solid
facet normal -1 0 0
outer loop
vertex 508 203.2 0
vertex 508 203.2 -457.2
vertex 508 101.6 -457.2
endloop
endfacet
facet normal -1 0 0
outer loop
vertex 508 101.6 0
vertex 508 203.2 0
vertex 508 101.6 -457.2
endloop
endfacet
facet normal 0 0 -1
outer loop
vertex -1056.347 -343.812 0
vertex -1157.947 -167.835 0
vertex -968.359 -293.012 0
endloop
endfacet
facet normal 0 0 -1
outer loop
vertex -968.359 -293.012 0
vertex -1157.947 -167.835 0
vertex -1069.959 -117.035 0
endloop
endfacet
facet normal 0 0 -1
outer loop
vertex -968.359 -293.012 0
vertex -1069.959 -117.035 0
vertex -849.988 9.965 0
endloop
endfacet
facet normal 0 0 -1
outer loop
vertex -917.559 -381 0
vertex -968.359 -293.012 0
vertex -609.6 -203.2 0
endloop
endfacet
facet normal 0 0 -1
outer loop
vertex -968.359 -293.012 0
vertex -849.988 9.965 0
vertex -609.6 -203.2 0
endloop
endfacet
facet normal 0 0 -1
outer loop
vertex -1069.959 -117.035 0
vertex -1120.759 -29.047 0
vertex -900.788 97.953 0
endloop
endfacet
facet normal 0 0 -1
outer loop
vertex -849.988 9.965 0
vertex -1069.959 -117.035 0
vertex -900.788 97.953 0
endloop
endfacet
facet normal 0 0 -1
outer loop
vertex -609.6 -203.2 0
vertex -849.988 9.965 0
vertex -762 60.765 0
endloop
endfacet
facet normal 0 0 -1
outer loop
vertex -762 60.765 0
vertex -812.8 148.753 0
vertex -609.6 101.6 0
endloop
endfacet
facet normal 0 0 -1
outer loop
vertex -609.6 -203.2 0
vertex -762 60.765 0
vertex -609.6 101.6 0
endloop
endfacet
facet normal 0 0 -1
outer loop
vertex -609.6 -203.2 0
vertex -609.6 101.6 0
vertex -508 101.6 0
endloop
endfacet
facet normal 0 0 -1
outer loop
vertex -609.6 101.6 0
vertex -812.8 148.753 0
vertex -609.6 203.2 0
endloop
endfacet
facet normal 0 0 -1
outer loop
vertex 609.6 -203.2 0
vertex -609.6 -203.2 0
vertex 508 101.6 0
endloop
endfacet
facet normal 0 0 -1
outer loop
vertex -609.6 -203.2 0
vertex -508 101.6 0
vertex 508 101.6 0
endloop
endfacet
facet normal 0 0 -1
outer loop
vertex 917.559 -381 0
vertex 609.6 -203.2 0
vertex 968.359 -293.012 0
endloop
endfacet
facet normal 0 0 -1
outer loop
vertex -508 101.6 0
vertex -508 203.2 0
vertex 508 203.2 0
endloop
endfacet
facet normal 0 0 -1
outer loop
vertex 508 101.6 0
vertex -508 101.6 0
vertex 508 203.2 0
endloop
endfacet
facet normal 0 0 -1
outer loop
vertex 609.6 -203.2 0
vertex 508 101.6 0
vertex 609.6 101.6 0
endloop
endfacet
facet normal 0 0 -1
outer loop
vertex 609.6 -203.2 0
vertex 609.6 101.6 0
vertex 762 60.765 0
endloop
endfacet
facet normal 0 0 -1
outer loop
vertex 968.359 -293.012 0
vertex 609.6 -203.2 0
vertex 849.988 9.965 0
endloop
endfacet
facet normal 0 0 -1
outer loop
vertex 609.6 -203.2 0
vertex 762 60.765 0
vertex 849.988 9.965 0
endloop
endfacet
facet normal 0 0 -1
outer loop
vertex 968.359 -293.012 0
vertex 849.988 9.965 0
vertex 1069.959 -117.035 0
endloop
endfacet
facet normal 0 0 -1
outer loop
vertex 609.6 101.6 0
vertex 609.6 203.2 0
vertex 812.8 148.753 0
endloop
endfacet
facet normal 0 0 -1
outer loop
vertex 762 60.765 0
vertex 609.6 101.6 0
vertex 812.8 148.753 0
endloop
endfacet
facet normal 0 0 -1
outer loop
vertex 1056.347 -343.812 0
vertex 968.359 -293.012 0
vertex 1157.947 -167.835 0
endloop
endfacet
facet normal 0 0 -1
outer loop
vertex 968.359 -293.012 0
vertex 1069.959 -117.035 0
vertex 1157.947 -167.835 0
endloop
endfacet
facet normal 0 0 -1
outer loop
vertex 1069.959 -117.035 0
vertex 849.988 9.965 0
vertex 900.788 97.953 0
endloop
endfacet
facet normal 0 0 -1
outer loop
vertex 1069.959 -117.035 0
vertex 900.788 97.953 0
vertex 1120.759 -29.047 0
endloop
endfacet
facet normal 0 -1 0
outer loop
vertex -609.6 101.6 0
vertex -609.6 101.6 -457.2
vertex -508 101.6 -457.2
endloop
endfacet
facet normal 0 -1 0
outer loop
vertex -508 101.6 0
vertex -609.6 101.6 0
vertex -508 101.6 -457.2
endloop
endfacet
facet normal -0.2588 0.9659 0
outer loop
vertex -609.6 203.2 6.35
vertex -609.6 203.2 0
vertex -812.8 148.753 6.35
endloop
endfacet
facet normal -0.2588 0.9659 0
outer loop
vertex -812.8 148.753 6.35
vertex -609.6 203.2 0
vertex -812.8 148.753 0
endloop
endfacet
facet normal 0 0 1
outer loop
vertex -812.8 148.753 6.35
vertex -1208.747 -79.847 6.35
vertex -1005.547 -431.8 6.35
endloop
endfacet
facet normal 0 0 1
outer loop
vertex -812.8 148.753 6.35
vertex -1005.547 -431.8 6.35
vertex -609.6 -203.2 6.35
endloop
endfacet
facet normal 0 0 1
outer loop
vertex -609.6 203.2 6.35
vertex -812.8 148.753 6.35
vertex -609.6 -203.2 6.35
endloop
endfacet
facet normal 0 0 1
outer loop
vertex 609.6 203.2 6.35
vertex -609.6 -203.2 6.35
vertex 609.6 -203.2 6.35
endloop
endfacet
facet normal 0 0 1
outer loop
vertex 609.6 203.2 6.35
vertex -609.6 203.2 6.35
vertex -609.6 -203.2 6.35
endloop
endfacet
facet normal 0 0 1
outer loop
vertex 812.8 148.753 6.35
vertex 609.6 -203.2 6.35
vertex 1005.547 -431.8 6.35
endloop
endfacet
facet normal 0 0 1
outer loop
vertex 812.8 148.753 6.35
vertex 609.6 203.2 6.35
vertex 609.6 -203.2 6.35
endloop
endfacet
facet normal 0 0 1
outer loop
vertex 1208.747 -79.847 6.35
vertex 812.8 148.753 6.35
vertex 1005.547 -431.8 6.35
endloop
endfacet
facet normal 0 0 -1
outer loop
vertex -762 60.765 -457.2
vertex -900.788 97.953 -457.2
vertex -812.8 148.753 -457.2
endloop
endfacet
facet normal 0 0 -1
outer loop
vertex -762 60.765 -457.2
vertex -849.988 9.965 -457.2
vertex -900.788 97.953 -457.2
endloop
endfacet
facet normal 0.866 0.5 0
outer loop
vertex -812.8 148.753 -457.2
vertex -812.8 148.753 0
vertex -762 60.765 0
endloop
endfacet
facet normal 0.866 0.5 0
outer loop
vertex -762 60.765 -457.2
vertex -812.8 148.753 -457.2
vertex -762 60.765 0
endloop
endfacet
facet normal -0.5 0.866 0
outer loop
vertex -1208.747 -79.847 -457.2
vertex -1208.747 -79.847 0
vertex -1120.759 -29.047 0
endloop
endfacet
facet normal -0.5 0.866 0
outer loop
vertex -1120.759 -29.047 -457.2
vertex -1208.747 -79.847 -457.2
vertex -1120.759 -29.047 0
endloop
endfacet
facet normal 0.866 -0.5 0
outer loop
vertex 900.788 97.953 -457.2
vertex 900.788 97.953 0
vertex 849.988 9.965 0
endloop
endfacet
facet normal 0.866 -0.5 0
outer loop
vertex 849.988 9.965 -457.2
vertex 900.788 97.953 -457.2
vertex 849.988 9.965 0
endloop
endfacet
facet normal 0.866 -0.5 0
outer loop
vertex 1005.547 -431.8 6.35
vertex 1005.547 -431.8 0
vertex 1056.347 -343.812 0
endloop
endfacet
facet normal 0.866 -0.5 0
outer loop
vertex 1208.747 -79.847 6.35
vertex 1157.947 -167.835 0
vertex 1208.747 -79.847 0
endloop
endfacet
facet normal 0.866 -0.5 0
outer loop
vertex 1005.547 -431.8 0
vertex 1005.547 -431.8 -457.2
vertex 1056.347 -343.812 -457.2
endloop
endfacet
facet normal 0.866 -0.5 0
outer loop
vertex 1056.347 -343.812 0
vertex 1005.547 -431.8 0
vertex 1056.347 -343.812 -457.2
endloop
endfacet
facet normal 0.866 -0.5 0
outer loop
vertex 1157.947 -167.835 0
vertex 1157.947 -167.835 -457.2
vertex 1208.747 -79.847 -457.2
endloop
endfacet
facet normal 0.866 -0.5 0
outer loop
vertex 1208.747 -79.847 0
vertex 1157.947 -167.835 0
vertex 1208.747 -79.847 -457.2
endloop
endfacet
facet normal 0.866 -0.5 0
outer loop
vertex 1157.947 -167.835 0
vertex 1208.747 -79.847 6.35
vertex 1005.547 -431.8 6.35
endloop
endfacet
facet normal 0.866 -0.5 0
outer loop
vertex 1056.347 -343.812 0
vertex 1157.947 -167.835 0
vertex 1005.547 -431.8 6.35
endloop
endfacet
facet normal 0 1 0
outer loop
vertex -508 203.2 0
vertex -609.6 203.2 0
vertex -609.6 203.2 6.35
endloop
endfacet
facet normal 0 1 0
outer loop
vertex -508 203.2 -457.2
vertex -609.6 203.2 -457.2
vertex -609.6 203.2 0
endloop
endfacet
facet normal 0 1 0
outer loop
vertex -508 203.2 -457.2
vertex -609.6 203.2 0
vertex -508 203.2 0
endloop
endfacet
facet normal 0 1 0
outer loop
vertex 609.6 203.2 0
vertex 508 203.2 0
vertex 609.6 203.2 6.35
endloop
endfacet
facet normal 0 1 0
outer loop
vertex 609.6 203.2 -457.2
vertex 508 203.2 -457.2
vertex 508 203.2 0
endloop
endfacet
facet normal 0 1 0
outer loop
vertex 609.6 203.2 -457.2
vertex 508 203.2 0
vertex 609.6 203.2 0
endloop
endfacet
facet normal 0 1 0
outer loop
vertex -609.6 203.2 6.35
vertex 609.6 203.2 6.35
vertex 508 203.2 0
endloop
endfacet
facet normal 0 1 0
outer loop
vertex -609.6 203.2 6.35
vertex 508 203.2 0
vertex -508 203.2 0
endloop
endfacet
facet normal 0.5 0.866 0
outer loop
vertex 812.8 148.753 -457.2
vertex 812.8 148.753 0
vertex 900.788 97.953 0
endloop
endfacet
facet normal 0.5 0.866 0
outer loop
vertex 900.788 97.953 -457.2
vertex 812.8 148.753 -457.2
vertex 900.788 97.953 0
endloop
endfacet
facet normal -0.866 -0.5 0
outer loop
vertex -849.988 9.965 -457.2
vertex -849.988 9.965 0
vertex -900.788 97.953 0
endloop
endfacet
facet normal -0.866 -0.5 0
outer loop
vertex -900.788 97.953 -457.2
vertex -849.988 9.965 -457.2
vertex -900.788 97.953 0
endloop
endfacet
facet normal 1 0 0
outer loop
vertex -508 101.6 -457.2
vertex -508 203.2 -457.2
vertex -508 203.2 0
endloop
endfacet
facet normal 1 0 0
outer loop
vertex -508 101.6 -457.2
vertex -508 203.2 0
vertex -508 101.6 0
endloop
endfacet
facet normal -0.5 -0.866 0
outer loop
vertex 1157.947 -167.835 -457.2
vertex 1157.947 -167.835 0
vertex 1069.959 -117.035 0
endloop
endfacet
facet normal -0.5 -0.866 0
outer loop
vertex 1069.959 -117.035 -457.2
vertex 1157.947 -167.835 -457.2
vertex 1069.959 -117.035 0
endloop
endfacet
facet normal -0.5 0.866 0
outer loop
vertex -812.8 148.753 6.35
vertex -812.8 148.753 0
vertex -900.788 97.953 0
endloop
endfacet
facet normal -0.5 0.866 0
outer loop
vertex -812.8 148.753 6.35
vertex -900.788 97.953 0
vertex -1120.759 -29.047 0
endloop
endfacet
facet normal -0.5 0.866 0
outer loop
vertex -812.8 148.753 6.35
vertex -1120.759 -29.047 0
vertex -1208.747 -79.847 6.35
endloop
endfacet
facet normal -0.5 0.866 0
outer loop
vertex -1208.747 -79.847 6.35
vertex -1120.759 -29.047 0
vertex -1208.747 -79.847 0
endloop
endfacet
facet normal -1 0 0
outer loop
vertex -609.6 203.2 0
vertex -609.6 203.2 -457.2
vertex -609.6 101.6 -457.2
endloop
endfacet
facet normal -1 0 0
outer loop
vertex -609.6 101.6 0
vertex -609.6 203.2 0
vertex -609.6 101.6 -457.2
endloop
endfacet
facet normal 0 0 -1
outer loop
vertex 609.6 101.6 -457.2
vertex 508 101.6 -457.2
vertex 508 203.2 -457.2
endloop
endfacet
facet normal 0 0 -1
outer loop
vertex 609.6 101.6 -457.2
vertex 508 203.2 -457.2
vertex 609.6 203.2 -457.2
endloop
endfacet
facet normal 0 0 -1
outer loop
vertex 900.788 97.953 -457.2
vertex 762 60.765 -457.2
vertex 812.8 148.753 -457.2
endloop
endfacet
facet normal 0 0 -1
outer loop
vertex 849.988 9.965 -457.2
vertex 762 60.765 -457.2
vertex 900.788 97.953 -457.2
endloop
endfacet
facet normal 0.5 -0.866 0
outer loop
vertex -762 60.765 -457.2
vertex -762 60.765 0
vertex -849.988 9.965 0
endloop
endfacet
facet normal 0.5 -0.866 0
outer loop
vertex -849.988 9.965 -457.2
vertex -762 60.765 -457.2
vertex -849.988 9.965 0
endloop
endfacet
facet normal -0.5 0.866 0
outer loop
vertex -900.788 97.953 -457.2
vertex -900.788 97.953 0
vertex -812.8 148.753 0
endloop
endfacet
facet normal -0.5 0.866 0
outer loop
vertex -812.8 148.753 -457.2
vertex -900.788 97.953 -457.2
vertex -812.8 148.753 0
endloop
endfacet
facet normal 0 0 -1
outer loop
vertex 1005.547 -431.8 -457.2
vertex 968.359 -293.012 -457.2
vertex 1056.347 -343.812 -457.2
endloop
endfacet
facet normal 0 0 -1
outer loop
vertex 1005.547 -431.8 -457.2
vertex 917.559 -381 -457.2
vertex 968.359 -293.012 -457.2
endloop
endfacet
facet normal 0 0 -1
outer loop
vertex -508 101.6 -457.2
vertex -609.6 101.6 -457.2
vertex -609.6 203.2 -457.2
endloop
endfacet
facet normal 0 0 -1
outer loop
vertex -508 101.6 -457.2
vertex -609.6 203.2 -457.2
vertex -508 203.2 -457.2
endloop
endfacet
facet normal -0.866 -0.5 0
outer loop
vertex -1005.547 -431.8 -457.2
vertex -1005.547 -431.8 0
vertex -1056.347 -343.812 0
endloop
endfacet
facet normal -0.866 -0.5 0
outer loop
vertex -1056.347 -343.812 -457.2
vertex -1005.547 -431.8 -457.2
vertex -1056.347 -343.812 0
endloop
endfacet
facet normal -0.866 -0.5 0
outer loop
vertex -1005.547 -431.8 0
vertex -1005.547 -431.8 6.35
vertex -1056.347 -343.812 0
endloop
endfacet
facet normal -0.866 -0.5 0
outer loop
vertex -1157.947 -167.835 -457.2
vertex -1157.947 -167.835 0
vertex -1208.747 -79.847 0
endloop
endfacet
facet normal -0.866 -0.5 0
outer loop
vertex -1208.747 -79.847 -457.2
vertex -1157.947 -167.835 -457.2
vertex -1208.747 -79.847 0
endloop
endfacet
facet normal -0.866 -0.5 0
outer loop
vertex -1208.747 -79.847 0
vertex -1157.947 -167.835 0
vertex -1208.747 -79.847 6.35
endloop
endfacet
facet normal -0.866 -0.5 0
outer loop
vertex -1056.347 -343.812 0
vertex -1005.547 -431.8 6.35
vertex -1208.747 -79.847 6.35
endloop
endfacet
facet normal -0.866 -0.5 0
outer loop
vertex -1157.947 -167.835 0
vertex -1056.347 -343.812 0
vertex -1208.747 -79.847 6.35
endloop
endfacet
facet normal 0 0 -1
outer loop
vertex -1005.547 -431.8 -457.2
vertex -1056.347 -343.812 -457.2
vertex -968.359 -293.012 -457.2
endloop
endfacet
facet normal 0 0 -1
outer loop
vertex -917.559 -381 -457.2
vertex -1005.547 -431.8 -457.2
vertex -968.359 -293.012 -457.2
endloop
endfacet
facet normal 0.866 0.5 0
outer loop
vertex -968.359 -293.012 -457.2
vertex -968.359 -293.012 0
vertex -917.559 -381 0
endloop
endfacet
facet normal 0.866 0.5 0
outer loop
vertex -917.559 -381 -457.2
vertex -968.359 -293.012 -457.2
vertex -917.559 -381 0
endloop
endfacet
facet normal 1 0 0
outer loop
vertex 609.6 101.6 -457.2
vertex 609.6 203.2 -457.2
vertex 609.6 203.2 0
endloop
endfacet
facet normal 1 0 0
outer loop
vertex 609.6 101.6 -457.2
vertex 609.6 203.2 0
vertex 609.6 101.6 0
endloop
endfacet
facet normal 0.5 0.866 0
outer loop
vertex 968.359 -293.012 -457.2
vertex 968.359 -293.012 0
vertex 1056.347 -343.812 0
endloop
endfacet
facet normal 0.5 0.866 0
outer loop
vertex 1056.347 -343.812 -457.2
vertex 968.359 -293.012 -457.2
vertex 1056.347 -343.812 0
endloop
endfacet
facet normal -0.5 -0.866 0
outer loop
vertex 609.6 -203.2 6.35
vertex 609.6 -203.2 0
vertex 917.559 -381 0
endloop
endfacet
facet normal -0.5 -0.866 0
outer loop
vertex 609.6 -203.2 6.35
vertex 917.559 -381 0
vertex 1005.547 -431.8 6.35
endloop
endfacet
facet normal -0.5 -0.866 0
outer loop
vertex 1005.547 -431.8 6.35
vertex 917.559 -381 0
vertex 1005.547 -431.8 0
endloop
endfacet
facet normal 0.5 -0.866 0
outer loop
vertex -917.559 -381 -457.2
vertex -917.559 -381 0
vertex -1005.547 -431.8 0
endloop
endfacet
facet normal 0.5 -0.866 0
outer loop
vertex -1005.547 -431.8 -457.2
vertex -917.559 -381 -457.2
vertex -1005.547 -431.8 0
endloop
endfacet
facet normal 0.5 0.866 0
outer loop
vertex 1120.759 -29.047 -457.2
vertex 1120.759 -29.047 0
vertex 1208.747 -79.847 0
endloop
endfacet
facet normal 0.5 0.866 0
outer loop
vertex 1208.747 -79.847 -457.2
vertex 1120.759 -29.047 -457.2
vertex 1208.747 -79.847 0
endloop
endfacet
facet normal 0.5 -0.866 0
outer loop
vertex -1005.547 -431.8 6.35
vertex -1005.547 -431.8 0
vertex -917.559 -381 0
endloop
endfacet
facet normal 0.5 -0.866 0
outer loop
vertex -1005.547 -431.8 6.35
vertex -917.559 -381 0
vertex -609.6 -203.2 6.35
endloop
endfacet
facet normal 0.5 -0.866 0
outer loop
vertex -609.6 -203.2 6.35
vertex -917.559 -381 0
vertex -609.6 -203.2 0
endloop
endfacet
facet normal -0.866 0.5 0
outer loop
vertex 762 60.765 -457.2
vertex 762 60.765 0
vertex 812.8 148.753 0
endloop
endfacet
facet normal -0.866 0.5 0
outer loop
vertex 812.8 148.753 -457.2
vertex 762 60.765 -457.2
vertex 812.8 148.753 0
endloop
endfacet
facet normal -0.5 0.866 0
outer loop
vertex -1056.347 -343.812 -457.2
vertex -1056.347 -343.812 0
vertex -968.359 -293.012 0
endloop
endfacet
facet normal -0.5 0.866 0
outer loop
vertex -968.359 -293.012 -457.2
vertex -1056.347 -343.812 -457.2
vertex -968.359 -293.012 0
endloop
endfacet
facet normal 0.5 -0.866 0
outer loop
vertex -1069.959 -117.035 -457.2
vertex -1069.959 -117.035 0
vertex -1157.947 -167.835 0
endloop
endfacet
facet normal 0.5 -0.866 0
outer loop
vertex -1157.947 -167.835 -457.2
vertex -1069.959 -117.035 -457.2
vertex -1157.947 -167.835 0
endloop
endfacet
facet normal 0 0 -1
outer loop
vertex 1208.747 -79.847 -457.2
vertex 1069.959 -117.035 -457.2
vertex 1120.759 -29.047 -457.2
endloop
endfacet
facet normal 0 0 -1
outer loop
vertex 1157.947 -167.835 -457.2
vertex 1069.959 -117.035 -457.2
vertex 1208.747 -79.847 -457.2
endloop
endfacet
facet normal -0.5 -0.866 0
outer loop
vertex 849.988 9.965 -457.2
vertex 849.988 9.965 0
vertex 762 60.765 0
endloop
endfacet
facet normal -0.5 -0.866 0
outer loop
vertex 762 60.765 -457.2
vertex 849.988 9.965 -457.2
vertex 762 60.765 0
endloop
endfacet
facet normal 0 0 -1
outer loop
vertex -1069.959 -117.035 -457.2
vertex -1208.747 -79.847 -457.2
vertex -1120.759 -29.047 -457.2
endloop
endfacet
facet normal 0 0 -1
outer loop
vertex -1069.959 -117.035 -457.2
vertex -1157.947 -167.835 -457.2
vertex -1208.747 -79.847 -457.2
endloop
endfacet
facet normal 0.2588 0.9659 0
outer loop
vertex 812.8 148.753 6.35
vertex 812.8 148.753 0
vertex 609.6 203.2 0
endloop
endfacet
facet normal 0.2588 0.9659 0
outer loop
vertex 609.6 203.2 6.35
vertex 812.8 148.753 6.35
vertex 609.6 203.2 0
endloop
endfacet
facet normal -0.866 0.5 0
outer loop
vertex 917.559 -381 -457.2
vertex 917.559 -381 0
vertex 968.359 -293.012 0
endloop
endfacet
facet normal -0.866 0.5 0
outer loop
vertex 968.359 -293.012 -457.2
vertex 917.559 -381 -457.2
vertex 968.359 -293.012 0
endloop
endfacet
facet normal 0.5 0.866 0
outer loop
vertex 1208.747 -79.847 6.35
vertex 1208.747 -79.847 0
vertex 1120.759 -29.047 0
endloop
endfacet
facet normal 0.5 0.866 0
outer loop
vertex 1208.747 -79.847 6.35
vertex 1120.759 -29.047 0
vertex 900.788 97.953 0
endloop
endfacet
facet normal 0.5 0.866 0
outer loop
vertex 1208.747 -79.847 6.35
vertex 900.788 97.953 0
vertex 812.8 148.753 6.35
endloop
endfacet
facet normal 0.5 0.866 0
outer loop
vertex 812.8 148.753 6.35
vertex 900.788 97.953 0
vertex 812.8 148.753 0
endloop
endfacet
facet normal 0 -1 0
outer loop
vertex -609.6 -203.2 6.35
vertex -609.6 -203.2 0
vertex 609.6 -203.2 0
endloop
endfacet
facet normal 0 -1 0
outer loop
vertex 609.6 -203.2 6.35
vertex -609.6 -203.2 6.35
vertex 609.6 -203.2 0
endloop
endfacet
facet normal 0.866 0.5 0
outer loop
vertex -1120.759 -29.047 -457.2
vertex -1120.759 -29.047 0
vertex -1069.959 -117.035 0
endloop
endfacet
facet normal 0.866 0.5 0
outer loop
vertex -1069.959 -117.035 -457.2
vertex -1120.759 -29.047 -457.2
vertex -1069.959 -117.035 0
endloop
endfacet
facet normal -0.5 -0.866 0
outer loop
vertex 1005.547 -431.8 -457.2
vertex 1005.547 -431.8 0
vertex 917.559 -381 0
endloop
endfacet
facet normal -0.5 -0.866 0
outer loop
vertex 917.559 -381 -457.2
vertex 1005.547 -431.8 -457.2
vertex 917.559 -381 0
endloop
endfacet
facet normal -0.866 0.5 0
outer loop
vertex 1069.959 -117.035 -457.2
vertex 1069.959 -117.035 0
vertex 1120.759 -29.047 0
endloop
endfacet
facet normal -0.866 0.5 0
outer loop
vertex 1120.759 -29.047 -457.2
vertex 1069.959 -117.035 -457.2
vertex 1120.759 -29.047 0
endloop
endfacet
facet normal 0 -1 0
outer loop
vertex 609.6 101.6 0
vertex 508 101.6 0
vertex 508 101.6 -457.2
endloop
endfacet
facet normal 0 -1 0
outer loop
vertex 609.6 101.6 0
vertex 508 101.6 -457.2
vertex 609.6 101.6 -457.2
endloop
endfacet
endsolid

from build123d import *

# Parameters (mm, degrees)
F0_W     = 1219.2
F0_H     = 406.4
F1_DEPTH = 6.35
F2_W     = 101.6
F2_H     = 101.6
F3_DEPTH = 457.2


with BuildPart() as f1:
    # F0 (on Top) → F1 (new body)
    with BuildSketch(Plane.XY):
        Polygon((812.8, 148.752724), (609.6, -203.2), (1005.546815, -431.8), (1208.746815, -79.847276), align=None)
        Polygon((812.8, 148.752724), (609.6, 203.2), (609.6, -203.2), align=None)
        Rectangle(F0_W, F0_H)
        Polygon((-609.6, -203.2), (-609.6, 203.2), (-812.8, 148.752724), align=None)
        Polygon((-1005.546815, -431.8), (-609.6, -203.2), (-812.8, 148.752724), (-1208.746815, -79.847276), align=None)
    extrude(amount=F1_DEPTH)

    # F2 (on face) → F3 (join)
    with BuildSketch(Plane(origin=(0, 0, 0), x_dir=(1, 0, 0), z_dir=(0, 0, -1))):
        Polygon((-968.358634, 293.011819), (-917.558634, 381), (-1005.546815, 431.8), (-1056.346815, 343.811819), align=None)
        Polygon((-1208.746815, 79.847276), (-1120.758634, 29.047276), (-1069.958634, 117.035457), (-1157.946815, 167.835457), align=None)
        Polygon((-900.788181, -97.952724), (-812.8, -148.752724), (-762, -60.764543), (-849.988181, -9.964543), align=None)
        with Locations((-558.8, -152.4)):
            Rectangle(F2_W, F2_H)
        Polygon((968.358634, 293.011819), (1056.346815, 343.811819), (1005.546815, 431.8), (917.558634, 381), align=None)
        Polygon((1120.758634, 29.047276), (1208.746815, 79.847276), (1157.946815, 167.835457), (1069.958634, 117.035457), align=None)
        Polygon((812.8, -148.752724), (900.788181, -97.952724), (849.988181, -9.964543), (762, -60.764543), align=None)
        with Locations((558.8, -152.4)):
            Rectangle(F2_W, F2_H)
    extrude(amount=F3_DEPTH)


solid = f1.part
